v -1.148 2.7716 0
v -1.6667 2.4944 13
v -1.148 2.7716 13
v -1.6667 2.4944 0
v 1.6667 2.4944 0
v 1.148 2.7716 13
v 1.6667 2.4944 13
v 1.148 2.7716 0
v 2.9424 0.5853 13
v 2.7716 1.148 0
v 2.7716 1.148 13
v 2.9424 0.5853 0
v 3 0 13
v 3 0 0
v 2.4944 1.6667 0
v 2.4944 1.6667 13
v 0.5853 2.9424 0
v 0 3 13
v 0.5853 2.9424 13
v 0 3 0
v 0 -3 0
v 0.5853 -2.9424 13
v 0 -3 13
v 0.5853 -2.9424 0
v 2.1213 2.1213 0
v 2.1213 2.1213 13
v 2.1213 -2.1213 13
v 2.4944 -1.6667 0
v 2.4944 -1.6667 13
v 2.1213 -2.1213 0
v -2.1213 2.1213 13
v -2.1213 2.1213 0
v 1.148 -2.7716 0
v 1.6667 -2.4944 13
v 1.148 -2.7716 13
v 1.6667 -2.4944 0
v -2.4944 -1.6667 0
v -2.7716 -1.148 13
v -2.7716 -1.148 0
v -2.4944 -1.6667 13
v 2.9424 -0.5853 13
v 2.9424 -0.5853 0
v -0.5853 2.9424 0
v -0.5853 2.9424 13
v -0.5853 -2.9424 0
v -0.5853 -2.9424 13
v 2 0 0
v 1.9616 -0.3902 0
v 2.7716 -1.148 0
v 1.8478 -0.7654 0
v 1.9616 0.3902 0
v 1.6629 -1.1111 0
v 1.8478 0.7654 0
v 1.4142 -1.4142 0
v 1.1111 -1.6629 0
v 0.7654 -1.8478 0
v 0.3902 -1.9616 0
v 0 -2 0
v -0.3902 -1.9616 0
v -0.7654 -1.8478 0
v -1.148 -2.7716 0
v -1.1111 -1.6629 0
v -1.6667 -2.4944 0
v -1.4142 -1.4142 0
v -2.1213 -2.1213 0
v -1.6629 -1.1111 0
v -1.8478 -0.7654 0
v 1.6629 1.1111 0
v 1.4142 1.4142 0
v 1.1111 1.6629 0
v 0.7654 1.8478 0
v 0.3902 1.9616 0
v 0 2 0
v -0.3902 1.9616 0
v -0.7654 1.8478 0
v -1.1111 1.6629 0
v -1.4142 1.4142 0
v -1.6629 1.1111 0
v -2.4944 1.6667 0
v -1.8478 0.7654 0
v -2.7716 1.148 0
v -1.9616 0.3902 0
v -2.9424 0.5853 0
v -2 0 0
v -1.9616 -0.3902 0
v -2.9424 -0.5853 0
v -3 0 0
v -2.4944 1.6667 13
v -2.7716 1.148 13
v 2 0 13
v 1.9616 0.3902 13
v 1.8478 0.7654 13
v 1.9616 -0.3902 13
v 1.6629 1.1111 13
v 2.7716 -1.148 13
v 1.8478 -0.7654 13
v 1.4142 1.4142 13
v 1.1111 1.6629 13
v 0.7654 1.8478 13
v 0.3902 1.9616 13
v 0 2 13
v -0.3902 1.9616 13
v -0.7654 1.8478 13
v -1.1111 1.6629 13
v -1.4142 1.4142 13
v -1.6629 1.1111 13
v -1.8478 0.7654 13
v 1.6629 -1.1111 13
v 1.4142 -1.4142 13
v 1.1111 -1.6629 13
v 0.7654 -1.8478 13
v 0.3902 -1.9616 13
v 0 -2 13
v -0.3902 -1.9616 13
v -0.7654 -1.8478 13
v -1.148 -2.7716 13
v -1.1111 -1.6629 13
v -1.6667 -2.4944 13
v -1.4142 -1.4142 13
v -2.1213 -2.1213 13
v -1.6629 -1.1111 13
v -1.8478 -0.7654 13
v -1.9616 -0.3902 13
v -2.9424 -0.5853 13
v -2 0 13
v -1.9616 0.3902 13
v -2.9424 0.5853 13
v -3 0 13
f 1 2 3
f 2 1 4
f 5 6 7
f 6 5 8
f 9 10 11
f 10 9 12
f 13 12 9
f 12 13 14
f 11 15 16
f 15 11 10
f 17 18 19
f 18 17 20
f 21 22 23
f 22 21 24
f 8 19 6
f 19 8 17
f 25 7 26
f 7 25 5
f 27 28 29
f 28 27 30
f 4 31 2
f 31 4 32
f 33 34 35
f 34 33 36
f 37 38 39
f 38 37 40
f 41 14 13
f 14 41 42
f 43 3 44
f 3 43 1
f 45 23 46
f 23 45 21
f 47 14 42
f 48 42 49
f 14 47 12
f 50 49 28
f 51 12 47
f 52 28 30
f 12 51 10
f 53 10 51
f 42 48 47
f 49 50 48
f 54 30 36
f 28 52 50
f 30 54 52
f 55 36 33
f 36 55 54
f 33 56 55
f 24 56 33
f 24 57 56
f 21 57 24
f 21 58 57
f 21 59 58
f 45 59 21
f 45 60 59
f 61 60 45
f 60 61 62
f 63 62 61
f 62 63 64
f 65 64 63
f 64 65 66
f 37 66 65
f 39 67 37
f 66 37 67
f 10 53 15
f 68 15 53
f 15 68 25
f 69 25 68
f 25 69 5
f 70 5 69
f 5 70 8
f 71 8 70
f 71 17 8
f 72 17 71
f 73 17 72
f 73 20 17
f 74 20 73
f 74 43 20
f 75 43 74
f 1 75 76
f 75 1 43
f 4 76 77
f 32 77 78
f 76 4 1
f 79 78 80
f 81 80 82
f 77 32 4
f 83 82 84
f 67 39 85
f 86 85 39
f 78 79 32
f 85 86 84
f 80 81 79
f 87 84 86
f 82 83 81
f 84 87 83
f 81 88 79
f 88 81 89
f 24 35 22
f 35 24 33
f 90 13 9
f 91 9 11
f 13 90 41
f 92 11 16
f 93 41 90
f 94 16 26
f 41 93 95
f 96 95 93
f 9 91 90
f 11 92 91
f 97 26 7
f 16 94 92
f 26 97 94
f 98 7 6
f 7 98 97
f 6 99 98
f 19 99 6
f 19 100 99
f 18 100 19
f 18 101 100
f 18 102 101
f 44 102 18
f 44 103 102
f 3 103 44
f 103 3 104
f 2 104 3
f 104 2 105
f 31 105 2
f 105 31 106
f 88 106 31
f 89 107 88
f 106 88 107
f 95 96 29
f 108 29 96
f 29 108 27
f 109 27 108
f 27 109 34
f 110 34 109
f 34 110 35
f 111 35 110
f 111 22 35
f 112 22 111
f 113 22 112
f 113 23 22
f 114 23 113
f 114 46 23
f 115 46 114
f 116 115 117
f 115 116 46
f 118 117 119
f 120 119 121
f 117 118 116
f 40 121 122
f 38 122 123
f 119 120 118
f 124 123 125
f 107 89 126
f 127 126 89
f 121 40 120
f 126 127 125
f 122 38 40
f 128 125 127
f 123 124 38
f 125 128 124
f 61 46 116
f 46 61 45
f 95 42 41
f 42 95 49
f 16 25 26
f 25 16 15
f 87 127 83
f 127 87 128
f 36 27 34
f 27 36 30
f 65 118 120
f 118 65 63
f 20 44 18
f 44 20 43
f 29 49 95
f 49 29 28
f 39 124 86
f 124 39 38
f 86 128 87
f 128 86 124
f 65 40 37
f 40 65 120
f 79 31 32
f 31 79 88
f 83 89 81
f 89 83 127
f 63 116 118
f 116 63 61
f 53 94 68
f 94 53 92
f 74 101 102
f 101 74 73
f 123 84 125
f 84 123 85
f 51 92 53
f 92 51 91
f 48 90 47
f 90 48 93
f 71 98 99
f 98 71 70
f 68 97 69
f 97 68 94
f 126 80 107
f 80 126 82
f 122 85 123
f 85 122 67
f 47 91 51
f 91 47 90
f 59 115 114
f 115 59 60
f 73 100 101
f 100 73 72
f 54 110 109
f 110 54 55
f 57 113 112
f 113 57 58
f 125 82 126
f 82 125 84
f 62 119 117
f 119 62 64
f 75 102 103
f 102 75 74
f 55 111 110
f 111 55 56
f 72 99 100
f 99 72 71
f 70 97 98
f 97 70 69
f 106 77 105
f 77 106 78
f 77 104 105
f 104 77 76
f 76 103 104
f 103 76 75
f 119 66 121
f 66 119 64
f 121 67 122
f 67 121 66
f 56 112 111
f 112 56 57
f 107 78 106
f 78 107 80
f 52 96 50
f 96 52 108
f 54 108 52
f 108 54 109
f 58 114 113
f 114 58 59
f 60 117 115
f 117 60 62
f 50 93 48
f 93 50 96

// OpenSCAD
height = 13;
inner_radius = 2;
outer_radius = 3;

difference() {
	cylinder(height, outer_radius, outer_radius, $fn=32);
	translate([0,0,-5]) cylinder(height + 10, inner_radius, inner_radius, $fn=32);
}
